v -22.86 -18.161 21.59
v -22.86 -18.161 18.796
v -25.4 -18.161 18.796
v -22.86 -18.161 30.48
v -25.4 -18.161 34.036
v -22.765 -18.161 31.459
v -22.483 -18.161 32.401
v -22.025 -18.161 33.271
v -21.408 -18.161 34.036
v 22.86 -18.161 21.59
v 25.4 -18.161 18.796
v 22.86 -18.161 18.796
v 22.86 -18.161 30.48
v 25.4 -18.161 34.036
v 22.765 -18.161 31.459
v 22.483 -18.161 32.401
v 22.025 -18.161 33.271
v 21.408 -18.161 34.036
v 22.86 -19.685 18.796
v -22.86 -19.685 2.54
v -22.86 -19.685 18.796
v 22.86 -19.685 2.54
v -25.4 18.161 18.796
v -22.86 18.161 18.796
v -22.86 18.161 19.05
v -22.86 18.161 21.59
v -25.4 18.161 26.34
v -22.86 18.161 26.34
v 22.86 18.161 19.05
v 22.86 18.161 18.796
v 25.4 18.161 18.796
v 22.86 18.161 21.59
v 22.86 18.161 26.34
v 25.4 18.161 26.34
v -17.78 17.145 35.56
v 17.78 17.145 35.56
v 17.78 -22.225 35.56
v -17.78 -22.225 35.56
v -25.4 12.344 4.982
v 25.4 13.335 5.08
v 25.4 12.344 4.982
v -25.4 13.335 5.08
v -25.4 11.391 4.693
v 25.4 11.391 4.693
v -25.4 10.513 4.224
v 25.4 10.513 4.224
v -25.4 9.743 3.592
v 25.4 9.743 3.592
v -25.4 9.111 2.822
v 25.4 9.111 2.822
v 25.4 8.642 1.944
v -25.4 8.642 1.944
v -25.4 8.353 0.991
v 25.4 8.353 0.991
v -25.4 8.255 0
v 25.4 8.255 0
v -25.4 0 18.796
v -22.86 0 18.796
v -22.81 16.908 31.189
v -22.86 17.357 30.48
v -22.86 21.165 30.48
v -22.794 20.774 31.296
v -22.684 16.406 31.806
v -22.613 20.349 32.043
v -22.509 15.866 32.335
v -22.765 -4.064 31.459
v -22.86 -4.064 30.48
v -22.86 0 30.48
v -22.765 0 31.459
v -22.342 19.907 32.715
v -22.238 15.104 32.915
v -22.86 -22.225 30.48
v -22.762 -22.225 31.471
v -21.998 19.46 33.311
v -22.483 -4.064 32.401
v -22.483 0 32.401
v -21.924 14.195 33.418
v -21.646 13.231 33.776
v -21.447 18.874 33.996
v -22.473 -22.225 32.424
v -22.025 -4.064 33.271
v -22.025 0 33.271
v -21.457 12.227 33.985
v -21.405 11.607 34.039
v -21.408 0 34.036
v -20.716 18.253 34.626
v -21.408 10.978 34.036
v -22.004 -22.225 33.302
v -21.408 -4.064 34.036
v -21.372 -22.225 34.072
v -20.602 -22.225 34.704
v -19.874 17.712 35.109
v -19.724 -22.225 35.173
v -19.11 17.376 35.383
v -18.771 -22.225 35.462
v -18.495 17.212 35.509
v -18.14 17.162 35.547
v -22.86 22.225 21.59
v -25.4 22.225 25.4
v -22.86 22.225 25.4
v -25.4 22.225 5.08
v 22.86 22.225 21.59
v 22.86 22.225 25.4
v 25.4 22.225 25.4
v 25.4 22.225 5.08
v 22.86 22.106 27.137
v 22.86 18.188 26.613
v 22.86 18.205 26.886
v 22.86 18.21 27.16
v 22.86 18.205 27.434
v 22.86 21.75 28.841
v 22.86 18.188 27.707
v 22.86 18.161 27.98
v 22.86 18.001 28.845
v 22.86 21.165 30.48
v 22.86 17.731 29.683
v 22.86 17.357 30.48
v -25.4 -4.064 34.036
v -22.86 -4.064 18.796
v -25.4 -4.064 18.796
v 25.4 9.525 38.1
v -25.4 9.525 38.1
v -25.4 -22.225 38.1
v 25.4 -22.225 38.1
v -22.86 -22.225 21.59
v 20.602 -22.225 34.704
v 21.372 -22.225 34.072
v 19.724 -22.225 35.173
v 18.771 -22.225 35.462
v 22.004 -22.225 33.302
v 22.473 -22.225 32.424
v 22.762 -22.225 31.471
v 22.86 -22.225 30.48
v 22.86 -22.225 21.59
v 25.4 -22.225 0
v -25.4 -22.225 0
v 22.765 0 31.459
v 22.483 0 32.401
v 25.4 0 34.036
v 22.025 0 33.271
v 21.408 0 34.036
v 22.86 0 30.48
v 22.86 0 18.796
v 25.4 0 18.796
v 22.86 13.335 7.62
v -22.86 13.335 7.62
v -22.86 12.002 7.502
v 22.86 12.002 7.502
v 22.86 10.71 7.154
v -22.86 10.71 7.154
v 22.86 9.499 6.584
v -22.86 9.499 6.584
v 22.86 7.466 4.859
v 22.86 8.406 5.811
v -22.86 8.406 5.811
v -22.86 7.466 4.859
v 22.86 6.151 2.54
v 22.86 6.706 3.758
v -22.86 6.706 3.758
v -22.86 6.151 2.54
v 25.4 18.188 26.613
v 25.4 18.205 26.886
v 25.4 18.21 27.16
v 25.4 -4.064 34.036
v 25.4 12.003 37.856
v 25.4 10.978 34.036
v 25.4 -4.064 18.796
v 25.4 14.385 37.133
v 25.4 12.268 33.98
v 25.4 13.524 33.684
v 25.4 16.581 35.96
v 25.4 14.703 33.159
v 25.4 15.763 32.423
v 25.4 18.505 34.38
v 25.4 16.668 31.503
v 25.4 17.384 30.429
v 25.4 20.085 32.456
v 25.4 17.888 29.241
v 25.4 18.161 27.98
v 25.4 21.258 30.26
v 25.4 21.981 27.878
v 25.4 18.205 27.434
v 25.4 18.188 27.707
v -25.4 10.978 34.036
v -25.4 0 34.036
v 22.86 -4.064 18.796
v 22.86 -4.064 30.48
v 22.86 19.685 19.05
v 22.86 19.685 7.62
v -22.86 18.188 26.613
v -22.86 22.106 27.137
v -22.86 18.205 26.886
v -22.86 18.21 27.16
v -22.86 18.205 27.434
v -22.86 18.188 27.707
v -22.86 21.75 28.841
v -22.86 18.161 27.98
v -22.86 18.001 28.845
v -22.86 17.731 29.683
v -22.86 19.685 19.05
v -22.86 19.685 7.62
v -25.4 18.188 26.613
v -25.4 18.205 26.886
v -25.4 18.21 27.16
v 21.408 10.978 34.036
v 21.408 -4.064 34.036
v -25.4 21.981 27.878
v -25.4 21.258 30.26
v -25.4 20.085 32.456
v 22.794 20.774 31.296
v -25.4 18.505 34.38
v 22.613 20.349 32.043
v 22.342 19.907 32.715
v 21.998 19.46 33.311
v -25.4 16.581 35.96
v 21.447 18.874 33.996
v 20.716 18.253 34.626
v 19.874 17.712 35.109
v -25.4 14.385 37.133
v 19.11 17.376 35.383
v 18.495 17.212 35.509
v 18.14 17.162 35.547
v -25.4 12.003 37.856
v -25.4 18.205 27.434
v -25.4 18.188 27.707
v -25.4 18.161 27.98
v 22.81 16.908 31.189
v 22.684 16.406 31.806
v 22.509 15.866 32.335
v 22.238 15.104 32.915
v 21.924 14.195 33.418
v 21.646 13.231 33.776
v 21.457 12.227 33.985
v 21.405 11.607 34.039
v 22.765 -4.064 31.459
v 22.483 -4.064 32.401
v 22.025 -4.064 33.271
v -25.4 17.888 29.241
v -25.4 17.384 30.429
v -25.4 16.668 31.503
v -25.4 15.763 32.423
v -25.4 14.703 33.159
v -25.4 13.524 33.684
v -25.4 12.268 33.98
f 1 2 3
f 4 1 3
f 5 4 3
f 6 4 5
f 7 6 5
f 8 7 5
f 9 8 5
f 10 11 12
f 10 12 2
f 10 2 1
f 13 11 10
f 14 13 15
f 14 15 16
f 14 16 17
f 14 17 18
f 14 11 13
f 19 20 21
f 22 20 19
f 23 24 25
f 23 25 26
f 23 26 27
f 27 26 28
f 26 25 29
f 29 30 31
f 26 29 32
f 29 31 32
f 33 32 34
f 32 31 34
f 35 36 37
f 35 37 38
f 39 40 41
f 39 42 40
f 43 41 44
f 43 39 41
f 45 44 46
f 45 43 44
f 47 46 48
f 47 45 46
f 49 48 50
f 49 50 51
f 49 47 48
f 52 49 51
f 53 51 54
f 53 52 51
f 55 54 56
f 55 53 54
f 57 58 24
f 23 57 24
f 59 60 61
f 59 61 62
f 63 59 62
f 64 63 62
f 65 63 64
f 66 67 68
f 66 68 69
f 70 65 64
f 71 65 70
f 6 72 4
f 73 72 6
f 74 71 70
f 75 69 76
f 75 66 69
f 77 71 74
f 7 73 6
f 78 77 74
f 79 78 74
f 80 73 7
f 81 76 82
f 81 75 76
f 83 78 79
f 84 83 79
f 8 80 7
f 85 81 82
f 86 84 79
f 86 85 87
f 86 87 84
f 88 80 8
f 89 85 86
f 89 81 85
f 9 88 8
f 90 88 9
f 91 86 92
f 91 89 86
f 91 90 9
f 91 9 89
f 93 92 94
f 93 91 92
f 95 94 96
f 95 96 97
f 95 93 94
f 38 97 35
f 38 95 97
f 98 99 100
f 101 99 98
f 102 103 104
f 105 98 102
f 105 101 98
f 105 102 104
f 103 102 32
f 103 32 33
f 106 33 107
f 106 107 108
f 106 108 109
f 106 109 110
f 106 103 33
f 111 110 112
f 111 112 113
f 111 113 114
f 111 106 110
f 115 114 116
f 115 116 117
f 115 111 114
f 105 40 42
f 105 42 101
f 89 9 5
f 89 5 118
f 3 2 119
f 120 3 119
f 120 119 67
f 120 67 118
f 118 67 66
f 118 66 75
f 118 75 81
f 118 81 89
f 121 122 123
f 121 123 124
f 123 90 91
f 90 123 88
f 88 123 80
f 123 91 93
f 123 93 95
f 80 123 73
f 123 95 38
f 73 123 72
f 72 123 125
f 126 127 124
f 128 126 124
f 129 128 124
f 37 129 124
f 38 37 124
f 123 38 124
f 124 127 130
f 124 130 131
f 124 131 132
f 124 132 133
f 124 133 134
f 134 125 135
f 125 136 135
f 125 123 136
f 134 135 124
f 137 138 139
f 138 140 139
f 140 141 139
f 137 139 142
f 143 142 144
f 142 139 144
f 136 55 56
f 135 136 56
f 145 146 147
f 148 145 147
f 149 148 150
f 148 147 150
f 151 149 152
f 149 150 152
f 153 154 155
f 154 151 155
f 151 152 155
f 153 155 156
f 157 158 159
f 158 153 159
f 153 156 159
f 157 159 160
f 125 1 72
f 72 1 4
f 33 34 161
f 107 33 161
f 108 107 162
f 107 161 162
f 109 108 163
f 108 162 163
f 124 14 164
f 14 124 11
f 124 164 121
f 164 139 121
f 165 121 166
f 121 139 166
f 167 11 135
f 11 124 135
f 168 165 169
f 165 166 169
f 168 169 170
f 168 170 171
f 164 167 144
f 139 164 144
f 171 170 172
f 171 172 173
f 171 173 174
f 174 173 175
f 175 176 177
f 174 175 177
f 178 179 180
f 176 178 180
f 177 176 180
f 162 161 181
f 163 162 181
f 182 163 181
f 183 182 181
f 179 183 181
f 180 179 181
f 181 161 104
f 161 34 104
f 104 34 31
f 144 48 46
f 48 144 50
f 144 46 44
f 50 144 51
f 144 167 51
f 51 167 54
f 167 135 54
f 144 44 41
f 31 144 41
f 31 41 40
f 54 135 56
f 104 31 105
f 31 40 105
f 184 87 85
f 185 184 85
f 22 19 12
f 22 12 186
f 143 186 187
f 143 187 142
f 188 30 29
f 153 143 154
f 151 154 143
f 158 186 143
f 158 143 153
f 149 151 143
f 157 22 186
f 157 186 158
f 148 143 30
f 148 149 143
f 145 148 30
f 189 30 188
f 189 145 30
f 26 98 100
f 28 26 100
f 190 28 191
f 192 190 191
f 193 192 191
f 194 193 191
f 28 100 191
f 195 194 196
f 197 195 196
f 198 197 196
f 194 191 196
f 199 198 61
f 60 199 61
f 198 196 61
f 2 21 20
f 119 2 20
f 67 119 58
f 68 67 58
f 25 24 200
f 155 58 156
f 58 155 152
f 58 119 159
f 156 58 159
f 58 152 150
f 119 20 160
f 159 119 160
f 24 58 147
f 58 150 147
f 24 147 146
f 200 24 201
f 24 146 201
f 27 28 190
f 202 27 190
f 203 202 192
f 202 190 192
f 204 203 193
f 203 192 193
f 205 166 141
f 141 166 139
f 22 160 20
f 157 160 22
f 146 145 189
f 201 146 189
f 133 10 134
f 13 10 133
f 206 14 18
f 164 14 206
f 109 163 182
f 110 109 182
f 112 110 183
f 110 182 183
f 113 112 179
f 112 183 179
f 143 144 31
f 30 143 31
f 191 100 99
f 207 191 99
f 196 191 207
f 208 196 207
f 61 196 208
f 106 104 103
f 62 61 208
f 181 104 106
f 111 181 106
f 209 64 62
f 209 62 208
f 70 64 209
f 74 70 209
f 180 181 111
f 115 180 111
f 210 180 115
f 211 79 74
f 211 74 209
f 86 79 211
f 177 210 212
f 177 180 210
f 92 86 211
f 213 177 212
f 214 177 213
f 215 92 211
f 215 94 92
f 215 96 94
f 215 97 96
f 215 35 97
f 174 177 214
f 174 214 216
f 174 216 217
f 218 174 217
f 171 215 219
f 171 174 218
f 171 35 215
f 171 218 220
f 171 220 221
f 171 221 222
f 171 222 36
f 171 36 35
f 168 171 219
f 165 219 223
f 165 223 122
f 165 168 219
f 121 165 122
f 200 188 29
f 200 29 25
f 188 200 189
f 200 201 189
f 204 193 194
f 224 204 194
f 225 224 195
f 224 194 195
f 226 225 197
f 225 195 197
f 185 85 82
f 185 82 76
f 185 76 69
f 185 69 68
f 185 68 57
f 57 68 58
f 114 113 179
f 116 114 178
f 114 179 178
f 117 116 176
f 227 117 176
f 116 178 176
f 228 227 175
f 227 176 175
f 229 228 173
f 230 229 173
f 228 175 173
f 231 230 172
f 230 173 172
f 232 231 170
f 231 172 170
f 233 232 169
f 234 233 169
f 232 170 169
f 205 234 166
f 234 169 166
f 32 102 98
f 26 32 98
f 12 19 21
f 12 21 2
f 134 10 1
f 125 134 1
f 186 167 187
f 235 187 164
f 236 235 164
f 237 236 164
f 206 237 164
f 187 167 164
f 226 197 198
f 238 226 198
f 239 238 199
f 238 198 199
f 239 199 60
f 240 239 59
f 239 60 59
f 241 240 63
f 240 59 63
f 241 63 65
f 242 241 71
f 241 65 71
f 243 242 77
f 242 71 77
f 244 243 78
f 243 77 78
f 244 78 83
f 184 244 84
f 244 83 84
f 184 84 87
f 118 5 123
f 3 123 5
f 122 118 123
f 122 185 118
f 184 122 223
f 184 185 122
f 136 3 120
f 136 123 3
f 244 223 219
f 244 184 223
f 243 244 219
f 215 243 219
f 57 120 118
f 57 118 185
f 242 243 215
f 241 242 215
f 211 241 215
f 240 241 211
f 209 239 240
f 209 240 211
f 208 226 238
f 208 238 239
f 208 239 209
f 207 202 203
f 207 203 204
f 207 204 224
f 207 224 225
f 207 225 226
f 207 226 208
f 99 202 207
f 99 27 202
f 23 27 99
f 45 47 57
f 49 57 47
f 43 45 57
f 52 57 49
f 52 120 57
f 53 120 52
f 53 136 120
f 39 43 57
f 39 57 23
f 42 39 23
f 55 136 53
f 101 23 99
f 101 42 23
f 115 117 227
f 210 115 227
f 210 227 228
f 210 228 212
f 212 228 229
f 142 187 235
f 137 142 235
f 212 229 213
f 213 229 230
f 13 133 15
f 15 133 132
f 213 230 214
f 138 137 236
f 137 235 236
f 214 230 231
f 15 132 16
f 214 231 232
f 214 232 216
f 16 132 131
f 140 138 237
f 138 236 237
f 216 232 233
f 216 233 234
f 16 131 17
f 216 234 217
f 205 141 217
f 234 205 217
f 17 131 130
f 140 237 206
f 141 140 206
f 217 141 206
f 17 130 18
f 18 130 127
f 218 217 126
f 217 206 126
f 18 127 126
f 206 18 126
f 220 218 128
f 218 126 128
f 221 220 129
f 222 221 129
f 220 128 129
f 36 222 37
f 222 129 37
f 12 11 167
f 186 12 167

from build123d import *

# Parameters (mm, degrees)
F0_W         = 50.8
F0_H         = 44.45
F1_DEPTH     = 38.1
F2_W         = 13.97
F2_H         = 5.08
F3_DEPTH     = 50.8
F4_R         = 12.7
F5_W         = 45.72
F5_H         = 13.97
F6_DEPTH     = 50.8
F7_R         = 5.08
F8_W         = 14.097
F8_H         = 15.24
F9_DEPTH     = 50.8
F10_R        = 5.07999
F11_T        = 2.54
F11_T3_DEPTH = 9.0721543583
F11_T5_DEPTH = 9.0721543583
F11_T7_DEPTH = 9.144
F11_T9_DEPTH = 9.144


# Not quite as in the source:
# - a fillet or chamfer is up to 0.001 mm smaller than in the source, because OpenCascade refuses the exact size
# - a shell that OpenCascade refuses in one call is made with other operations: the cavity is built on its own and cut out


with BuildPart() as f1:
    # F0 (on Top) → F1 (new body)
    with BuildSketch(Plane.XY):
        Rectangle(F0_W, F0_H)
    extrude(amount=F1_DEPTH)

    # F2 (on face) → F3 (cut)
    with BuildSketch(Plane.YZ.offset(25.4)):
        with Locations((15.24, 2.54)):
            Rectangle(F2_W, F2_H)
    extrude(amount=-F3_DEPTH, mode=Mode.SUBTRACT)

    # F4
    f4_edges = [f1.edges().sort_by_distance(p)[0] for p in [
        (0, 22.225, 38.1),
    ]]
    fillet(f4_edges, radius=F4_R)

    # F5 (on face) → F6 (cut)
    with BuildSketch(Plane(origin=(0, 22.225, 0), x_dir=(-1, 0, 0), z_dir=(0, 1, 0))):
        with Locations((0, 28.575)):
            Rectangle(F5_W, F5_H)
    extrude(amount=-F6_DEPTH, mode=Mode.SUBTRACT)

    # F7
    f7_edges = [f1.edges().sort_by_distance(p)[0] for p in [
        (22.86, -2.54, 35.56),
        (-22.86, -2.54, 35.56),
    ]]
    fillet(f7_edges, radius=F7_R)

    # F8 (on face) → F9 (cut)
    with BuildSketch(Plane.YZ.offset(25.4)):
        with BuildLine():
            ThreePointArc((18.161, 26.3400295448), (18.1977232283, 26.7491865029), (18.2099788483, 27.1598053184))
            ThreePointArc((18.2099788483, 27.1598053184), (18.1977232283, 27.5704241338), (18.161, 27.9795810919))
            Line((18.161, 27.9795810919), (18.161, 26.3400295448))
        make_face()
        with BuildLine():
            Line((18.161, 26.3400295448), (18.161, 27.9795810919))
            ThreePointArc((18.161, 27.9795810919), (15.7632997742, 32.4232792644), (10.978474631, 34.036))
            ThreePointArc((10.978474631, 34.036), (6.2916716696, 22.46222933), (18.161, 26.3400295448))
        make_face()
        with BuildLine():
            Line((18.161, 18.796), (18.161, 26.3400295448))
            ThreePointArc((18.161, 26.3400295448), (6.2916716696, 22.46222933), (10.978474631, 34.036))
            Line((10.978474631, 34.036), (0, 34.036))
            Line((0, 34.036), (0, 18.796))
            Line((0, 18.796), (18.161, 18.796))
        make_face()
        with Locations((-11.1125, 26.416)):
            Rectangle(F8_W, F8_H)
    extrude(amount=-F9_DEPTH, mode=Mode.SUBTRACT)

    # F10 (radius 5.08 in the source; OpenCascade refuses exactly that, so slightly less here)
    f10_edges = [f1.edges().sort_by_distance(p)[0] for p in [
        (0, 8.255, 5.08),
    ]]
    fillet(f10_edges, radius=F10_R)

    # F11: shell of thickness 2.54, made by hand


with BuildPart() as f11_core1:
    # F11_t2: copy of F1
    add(f1.part)

    # the walls: a layer under each face that stays
    f11_faces = [f11_core1.faces().sort_by_distance(p)[0] for p in [
        (-25.4, 14.8166666667, 6.35),
        (0, 17.779995, 5.08),
        (0, 9.7428946226, 3.5921053774),
        (0, 22.225, 15.24),
        (0, 8.255, 5e-06),
        (16.9333333333, 12.8120018728, 37.6672579939),
        (0, -6.985, 0),
        (0, -6.35, 38.1),
        (0, -22.225, 19.05),
        (-23.4039228208, 5.4892373155, 34.036),
        (-23.3996024836, 16.3584390419, 31.8573813067),
        (-23.4039228208, -11.1125, 34.036),
        (-16.9333333333, -18.161, 21.336),
        (25.4, -14.8166666667, 6.35),
        (-22.86, 19.7907563947, 26.035),
        (0, 20.193, 21.59),
        (22.86, 19.7907563947, 26.035),
        (-21.3721024484, -0.5301288674, 34.0721024484),
        (0, -2.54, 35.56),
        (21.3721024484, -0.5301288674, 34.0721024484),
        (22.86, -20.193, 26.035),
        (0, -20.193, 21.59),
        (-22.86, -20.193, 26.035),
        (-22.86, -2.032, 26.035),
        (22.86, -2.032, 26.035),
        (23.4039228208, 5.4892373155, 34.036),
        (23.3996024836, 16.3584390419, 31.8573813067),
        (23.4039228208, -11.1125, 34.036),
    ]]
    thicken(f11_faces, amount=-F11_T, mode=Mode.SUBTRACT)

    # F11_s4 → F11_t3 (cut)
    with BuildSketch(Plane.YZ.offset(-27.94)):
        Polygon((-18.1356, 34.0106), (-18.161, 36.576), (-20.701, 36.576), (-20.701, 34.036), align=None)
    extrude(amount=F11_T3_DEPTH, mode=Mode.SUBTRACT)

    # F11_s6 → F11_t5 (cut)
    with BuildSketch(Plane.YZ.offset(18.8678456417)):
        Polygon((-18.1356, 34.0106), (-20.701, 34.036), (-20.701, 36.576), (-18.161, 36.576), align=None)
    extrude(amount=F11_T5_DEPTH, mode=Mode.SUBTRACT)

    # F11_s8 → F11_t7 (cut)
    with BuildSketch(Plane.XZ.offset(-24.765)):
        Polygon((-22.8346, 21.6154), (-25.4, 21.59), (-25.4, 19.05), (-22.86, 19.05), align=None)
        Polygon((22.8346, 21.6154), (22.86, 19.05), (25.4, 19.05), (25.4, 21.59), align=None)
    extrude(amount=F11_T7_DEPTH, mode=Mode.SUBTRACT)

    # F11_s10 → F11_t9 (cut)
    with BuildSketch(Plane.XZ.offset(15.621)):
        Polygon((22.8346, 21.6154), (25.4, 21.59), (25.4, 19.05), (22.86, 19.05), align=None)
        Polygon((-22.8346, 21.6154), (-22.86, 19.05), (-25.4, 19.05), (-25.4, 21.59), align=None)
    extrude(amount=F11_T9_DEPTH, mode=Mode.SUBTRACT)


with BuildPart() as f1_1:
    add(f1.part)

    # what is left inside the walls is the cavity
    f11_cavity = [f11_core1.part.solids().sort_by_distance(p)[0] for p in [
        (0, -11.073069, 2.5654),
    ]]
    add(f11_cavity, mode=Mode.SUBTRACT)


solid = f1_1.part
